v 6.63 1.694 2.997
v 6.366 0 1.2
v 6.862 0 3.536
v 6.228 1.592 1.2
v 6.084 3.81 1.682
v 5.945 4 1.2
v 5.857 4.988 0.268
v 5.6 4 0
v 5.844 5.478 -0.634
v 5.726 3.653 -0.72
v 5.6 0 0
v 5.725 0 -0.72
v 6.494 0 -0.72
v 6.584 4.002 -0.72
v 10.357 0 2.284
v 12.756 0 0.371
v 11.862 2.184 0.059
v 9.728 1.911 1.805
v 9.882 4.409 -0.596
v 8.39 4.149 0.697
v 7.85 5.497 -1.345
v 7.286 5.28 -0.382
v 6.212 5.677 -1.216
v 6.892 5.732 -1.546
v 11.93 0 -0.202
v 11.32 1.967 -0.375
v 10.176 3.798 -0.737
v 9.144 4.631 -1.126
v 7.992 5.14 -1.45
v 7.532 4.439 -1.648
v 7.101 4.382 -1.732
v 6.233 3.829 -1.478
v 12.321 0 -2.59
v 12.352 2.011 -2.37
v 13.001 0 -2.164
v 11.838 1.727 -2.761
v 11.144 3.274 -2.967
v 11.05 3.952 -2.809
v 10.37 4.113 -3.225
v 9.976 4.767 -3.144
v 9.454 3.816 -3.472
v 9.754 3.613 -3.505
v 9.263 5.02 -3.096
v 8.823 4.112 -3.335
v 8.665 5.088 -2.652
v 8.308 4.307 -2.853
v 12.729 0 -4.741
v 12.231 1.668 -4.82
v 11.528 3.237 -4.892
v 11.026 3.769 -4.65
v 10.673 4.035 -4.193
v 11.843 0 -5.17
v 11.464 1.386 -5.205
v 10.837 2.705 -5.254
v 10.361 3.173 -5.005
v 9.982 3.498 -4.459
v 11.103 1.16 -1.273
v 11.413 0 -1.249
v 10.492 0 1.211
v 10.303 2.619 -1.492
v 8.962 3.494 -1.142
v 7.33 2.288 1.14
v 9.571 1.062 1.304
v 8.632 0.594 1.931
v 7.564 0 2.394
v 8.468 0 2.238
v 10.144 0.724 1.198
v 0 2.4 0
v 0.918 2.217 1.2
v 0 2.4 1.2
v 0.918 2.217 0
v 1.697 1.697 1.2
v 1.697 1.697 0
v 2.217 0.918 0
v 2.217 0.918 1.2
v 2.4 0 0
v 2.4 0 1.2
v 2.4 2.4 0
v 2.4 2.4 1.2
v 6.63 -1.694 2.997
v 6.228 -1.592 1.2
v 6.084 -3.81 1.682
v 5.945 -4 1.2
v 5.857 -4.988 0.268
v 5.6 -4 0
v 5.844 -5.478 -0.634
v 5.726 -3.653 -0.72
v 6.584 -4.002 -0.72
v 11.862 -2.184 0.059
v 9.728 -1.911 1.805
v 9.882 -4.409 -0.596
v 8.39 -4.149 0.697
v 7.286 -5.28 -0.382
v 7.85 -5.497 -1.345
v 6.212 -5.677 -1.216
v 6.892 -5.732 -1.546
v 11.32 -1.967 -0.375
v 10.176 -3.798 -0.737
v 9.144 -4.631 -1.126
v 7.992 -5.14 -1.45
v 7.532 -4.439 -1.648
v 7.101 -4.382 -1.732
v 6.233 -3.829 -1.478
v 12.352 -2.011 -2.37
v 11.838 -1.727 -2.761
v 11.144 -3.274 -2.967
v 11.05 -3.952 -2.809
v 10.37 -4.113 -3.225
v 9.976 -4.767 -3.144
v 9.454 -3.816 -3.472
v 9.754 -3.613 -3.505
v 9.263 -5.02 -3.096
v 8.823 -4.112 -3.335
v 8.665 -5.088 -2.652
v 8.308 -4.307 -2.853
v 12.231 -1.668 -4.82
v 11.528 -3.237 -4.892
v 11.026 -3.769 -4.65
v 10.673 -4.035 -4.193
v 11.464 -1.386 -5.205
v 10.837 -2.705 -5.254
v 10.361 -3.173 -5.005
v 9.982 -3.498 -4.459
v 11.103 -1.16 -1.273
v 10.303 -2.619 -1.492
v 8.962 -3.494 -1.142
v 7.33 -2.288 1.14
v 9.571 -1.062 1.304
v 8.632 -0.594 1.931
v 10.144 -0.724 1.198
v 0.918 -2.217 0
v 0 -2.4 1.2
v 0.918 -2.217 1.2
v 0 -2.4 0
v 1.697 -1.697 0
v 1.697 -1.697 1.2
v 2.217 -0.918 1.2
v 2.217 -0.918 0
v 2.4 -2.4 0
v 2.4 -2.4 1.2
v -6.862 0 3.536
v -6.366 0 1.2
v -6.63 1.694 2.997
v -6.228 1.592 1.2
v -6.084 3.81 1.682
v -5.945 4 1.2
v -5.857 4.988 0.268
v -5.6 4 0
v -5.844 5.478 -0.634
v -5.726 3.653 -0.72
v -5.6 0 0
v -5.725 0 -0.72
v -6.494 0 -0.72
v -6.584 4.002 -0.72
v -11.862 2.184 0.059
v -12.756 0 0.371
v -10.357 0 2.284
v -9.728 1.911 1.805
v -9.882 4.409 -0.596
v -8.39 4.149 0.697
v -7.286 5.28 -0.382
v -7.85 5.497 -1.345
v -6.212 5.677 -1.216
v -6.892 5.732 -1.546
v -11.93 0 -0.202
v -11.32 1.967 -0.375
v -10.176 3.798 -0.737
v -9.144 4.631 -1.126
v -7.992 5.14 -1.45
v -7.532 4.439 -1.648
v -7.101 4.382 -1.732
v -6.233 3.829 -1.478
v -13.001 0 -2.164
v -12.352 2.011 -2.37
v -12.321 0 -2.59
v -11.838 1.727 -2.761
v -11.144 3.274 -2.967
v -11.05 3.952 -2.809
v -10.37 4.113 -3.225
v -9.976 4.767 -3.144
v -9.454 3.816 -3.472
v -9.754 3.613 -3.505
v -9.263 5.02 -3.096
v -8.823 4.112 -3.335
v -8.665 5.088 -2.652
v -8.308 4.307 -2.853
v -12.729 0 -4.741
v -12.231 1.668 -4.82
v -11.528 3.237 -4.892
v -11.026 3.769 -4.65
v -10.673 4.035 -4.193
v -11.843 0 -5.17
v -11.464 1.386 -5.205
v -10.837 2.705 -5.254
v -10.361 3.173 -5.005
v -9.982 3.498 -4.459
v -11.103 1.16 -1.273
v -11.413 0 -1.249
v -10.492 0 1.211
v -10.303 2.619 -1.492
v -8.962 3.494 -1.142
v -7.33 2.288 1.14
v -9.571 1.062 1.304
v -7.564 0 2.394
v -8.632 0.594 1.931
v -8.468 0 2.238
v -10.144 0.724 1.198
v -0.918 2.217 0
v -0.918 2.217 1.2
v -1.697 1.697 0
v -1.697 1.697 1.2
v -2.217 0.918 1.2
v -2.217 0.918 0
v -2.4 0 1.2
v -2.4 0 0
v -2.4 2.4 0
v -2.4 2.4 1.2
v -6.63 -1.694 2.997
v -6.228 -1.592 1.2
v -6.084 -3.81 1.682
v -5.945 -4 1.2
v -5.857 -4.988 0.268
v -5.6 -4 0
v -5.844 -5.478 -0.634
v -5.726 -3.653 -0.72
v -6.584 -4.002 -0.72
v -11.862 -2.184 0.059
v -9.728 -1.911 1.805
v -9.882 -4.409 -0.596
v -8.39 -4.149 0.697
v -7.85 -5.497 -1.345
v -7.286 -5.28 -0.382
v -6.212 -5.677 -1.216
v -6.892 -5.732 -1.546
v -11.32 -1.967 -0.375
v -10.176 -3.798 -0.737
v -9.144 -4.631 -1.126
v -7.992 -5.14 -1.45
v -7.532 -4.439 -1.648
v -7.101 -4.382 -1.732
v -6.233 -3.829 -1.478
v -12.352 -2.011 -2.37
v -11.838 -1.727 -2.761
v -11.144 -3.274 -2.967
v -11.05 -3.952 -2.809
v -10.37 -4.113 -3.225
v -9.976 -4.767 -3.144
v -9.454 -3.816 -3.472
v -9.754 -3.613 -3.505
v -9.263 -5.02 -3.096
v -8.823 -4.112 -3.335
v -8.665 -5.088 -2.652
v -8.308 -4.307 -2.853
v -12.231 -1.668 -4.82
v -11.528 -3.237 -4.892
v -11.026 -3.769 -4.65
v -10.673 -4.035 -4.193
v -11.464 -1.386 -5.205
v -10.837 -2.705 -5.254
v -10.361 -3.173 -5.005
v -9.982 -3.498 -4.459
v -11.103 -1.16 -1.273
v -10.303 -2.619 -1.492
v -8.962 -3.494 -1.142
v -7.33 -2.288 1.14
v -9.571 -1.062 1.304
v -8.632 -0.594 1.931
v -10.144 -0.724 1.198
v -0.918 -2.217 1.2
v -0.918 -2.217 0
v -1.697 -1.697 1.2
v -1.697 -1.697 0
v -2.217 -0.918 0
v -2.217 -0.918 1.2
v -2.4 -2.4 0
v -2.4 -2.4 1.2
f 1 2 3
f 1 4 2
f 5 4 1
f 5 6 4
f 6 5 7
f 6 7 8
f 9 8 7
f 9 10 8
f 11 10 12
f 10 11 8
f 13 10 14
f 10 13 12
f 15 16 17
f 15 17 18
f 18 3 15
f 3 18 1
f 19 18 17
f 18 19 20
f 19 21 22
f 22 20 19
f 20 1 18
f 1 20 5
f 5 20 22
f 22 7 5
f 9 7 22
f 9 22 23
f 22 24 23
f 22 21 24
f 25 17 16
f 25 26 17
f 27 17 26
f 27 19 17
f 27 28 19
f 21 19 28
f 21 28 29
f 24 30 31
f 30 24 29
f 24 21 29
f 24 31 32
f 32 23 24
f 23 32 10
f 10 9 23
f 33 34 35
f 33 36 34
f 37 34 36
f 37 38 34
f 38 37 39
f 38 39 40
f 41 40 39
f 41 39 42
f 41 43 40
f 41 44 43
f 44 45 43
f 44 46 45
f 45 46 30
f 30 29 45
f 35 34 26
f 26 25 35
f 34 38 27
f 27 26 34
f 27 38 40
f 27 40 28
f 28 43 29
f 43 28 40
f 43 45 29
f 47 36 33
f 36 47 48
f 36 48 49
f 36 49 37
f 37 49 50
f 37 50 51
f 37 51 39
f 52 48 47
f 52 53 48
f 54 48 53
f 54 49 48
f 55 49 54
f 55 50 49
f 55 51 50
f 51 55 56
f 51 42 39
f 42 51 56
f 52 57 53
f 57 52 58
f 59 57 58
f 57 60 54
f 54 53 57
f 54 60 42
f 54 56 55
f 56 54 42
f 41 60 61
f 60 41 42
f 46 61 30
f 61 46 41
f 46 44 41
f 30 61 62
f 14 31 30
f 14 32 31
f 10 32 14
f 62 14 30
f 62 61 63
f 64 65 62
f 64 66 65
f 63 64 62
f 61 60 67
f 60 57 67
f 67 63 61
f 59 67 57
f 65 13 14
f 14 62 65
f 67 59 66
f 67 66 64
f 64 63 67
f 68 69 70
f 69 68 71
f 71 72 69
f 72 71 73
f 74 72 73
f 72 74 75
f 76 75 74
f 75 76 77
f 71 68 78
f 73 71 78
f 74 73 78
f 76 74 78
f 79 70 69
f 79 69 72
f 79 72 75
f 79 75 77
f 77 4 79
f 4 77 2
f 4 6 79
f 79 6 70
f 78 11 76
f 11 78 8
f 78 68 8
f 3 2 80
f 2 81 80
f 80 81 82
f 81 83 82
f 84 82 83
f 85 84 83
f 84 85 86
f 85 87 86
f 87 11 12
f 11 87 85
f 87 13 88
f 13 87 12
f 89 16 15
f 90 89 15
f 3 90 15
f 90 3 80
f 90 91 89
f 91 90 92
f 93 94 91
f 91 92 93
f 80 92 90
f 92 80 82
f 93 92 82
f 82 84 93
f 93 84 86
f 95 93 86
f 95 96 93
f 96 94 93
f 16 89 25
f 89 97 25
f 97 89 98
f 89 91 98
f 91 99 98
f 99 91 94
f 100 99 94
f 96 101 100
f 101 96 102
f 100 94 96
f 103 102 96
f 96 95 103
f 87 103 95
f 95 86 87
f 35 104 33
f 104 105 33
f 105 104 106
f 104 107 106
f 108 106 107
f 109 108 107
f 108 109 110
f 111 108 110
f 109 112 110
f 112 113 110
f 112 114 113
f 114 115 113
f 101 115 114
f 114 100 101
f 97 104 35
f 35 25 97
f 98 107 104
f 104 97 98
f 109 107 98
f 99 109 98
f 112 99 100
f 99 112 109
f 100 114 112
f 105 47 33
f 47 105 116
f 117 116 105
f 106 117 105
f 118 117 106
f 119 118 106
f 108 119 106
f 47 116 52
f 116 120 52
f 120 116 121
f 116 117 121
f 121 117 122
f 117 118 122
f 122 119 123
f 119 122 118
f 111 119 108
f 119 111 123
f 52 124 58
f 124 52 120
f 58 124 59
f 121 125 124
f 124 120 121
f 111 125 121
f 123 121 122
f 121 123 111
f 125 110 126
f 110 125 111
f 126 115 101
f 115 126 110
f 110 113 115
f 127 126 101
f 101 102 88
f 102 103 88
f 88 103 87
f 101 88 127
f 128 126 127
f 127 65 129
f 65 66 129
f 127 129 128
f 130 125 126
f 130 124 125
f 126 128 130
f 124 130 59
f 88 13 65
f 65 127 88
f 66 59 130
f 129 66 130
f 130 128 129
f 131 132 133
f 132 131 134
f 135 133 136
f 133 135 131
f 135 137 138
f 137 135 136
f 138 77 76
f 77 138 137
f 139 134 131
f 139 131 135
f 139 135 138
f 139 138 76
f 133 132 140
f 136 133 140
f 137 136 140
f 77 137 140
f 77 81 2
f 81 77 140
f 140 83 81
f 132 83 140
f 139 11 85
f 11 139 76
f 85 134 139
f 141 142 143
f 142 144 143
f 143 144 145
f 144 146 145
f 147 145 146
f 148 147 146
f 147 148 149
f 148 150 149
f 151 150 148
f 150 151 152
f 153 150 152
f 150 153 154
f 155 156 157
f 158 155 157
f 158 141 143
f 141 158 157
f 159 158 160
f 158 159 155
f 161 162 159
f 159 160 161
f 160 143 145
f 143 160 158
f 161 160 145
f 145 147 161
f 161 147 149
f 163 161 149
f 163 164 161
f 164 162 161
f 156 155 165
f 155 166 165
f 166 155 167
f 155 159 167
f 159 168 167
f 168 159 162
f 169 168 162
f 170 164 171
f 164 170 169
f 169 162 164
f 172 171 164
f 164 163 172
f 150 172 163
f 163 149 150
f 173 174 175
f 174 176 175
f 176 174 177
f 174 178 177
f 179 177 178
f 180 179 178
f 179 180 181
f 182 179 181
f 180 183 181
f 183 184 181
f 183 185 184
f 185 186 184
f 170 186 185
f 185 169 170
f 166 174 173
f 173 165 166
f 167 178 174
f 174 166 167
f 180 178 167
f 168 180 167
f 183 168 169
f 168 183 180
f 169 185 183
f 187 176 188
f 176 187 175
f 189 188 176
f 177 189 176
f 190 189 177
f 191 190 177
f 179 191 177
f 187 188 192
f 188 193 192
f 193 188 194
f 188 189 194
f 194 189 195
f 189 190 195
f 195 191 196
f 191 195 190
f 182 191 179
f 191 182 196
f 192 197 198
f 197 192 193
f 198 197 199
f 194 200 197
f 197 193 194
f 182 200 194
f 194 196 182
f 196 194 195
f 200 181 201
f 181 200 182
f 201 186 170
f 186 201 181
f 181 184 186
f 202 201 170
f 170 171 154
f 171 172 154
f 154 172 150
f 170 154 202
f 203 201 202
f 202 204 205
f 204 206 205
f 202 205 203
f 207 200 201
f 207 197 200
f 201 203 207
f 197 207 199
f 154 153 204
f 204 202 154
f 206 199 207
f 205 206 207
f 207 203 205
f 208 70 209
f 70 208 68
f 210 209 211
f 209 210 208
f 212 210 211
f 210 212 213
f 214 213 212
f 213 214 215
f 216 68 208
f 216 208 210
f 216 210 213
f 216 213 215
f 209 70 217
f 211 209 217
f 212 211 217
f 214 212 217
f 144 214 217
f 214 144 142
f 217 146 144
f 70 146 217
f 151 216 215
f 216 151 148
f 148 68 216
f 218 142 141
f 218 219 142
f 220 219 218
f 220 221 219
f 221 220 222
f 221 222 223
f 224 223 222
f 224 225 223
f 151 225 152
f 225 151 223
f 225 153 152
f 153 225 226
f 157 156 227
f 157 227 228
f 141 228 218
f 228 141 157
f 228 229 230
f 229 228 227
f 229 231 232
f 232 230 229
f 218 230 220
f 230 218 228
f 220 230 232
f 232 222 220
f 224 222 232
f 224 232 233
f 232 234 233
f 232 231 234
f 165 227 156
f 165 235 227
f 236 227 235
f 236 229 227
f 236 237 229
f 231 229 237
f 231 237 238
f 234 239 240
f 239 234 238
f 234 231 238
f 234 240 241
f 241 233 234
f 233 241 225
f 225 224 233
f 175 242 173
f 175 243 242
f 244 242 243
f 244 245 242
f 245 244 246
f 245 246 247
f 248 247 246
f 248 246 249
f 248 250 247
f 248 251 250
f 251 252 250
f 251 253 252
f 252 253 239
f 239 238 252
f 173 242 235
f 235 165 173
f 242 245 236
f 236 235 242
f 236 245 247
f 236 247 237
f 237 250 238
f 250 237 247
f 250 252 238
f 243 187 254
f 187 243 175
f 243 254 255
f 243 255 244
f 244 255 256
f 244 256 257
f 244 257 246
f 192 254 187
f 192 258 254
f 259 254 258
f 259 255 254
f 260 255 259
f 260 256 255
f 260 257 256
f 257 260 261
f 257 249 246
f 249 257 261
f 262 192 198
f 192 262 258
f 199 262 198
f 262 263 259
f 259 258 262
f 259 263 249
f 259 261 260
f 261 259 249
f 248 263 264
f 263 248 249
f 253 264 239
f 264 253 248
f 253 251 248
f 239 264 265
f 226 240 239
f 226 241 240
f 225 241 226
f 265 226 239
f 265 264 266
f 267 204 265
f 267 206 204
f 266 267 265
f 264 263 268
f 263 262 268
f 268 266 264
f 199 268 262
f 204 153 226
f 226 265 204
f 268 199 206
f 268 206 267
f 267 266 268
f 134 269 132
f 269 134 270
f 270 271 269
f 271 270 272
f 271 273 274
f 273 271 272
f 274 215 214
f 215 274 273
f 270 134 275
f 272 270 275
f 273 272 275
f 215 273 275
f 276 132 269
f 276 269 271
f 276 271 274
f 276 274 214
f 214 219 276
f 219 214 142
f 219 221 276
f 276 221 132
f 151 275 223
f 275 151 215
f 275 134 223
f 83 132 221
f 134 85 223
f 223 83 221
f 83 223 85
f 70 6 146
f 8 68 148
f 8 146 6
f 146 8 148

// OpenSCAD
// file: ../p/1-4edge.scad
use <../lib.scad>
function ldraw_lib__1_4edge() = [
// 0 Circle 0.25
// 0 Name: 1-4edge.dat
// 0 Author: James Jessiman
// 0 !LDRAW_ORG Primitive UPDATE 2017-01
// 0 !LICENSE Licensed under CC BY 4.0 : see CAreadme.txt
// 
// 0 BFC CERTIFY CCW
  [0,"BFC","CERTIFY"],
  [0,"BFC","CCW"],
// 
// 0 !HISTORY 2007-06-22 [PTadmin] Header formatted for Contributor Agreement
// 0 !HISTORY 2008-07-01 [PTadmin] Official Update 2008-01
// 0 !HISTORY 2017-01-15 [Steffen] BFCed
// 0 !HISTORY 2017-12-30 [PTadmin] Official Update 2017-01
// 
// 
// 2 24 1 0 0 0.9239 0 0.3827
  [2,24,1,0,0,0.9239,0,0.3827],
// 2 24 0.9239 0 0.3827 0.7071 0 0.7071
  [2,24,0.9239,0,0.3827,0.7071,0,0.7071],
// 2 24 0.7071 0 0.7071 0.3827 0 0.9239
  [2,24,0.7071,0,0.7071,0.3827,0,0.9239],
// 2 24 0.3827 0 0.9239 0 0 1
  [2,24,0.3827,0,0.9239,0,0,1],
];
module ldraw_lib__1_4edge(step=0, col=false, unit=2/5, alt=false, line=0.2, solid=!$preview)
    makepoly(ldraw_lib__1_4edge(), step=step, col=col, unit=unit, alt=alt, line=line, solid=solid);
ldraw_lib__1_4edge(line=0.2);
// file: ../p/1-4cyli.scad
use <../lib.scad>
function ldraw_lib__1_4cyli() = [
// 0 Cylinder 0.25
// 0 Name: 1-4cyli.dat
// 0 Author: James Jessiman
// 0 !LDRAW_ORG Primitive UPDATE 2012-01
// 0 !LICENSE Licensed under CC BY 4.0 : see CAreadme.txt
// 
// 0 BFC CERTIFY CCW
  [0,"BFC","CERTIFY"],
  [0,"BFC","CCW"],
// 
// 0 !HISTORY 2002-03-23 [sbliss] Added BFC statement.
// 0 !HISTORY 2002-04-25 [PTadmin] Official Update 2002-02
// 0 !HISTORY 2007-06-22 [PTadmin] Header formatted for Contributor Agreement
// 0 !HISTORY 2008-07-01 [PTadmin] Official Update 2008-01
// 0 !HISTORY 2012-02-16 [Philo] Changed to CCW
// 0 !HISTORY 2012-03-30 [PTadmin] Official Update 2012-01
// 
// 
// 4 16 1 1 0 0.9239 1 0.3827 0.9239 0 0.3827 1 0 0
  [4,16,1,1,0,0.9239,1,0.3827,0.9239,0,0.3827,1,0,0],
// 5 24 1 0 0 1 1 0 0.9239 0 0.3827 1 0 -1
  [5,24,1,0,0,1,1,0,0.9239,0,0.3827,1,0,-1],
// 4 16 0.9239 1 0.3827 0.7071 1 0.7071 0.7071 0 0.7071 0.9239 0 0.3827
  [4,16,0.9239,1,0.3827,0.7071,1,0.7071,0.7071,0,0.7071,0.9239,0,0.3827],
// 5 24 0.9239 0 0.3827 0.9239 1 0.3827 0.7071 0 0.7071 1 0 0
  [5,24,0.9239,0,0.3827,0.9239,1,0.3827,0.7071,0,0.7071,1,0,0],
// 4 16 0.7071 1 0.7071 0.3827 1 0.9239 0.3827 0 0.9239 0.7071 0 0.7071
  [4,16,0.7071,1,0.7071,0.3827,1,0.9239,0.3827,0,0.9239,0.7071,0,0.7071],
// 5 24 0.7071 0 0.7071 0.7071 1 0.7071 0.3827 0 0.9239 0.9239 0 0.3827
  [5,24,0.7071,0,0.7071,0.7071,1,0.7071,0.3827,0,0.9239,0.9239,0,0.3827],
// 4 16 0.3827 1 0.9239 0 1 1 0 0 1 0.3827 0 0.9239
  [4,16,0.3827,1,0.9239,0,1,1,0,0,1,0.3827,0,0.9239],
// 5 24 0.3827 0 0.9239 0.3827 1 0.9239 0 0 1 0.7071 0 0.7071
  [5,24,0.3827,0,0.9239,0.3827,1,0.9239,0,0,1,0.7071,0,0.7071],
// 5 24 0 0 1 0 1 1 0.3827 0 0.9239 -1 0 1
  [5,24,0,0,1,0,1,1,0.3827,0,0.9239,-1,0,1],
];
module ldraw_lib__1_4cyli(step=0, col=false, unit=2/5, alt=false, line=0.2, solid=!$preview)
    makepoly(ldraw_lib__1_4cyli(), step=step, col=col, unit=unit, alt=alt, line=line, solid=solid);
ldraw_lib__1_4cyli(line=0.2);
// file: ../p/1-4ndis.scad
use <../lib.scad>
function ldraw_lib__1_4ndis() = [
// 0 Disc Negative 0.25
// 0 Name: 1-4ndis.dat
// 0 Author: James Jessiman
// 0 !LDRAW_ORG Primitive UPDATE 2012-01
// 0 !LICENSE Licensed under CC BY 4.0 : see CAreadme.txt
// 
// 0 BFC CERTIFY CCW
  [0,"BFC","CERTIFY"],
  [0,"BFC","CCW"],
// 
// 0 !HISTORY 2002-03-23 [sbliss] Added BFC Statement
// 0 !HISTORY 2002-04-25 [PTadmin] Official Update 2002-02
// 0 !HISTORY 2007-06-22 [PTadmin] Header formatted for Contributor Agreement
// 0 !HISTORY 2008-07-01 [PTadmin] Official Update 2008-01
// 0 !HISTORY 2012-02-16 [Philo] Changed to CCW
// 0 !HISTORY 2012-03-30 [PTadmin] Official Update 2012-01
// 
// 
// 3 16 0.9239 0 0.3827 1 0 0 1 0 1
  [3,16,0.9239,0,0.3827,1,0,0,1,0,1],
// 3 16 0.7071 0 0.7071 0.9239 0 0.3827 1 0 1
  [3,16,0.7071,0,0.7071,0.9239,0,0.3827,1,0,1],
// 3 16 0.3827 0 0.9239 0.7071 0 0.7071 1 0 1
  [3,16,0.3827,0,0.9239,0.7071,0,0.7071,1,0,1],
// 3 16 0 0 1 0.3827 0 0.9239 1 0 1
  [3,16,0,0,1,0.3827,0,0.9239,1,0,1],
];
module ldraw_lib__1_4ndis(step=0, col=false, unit=2/5, alt=false, line=0.2, solid=!$preview)
    makepoly(ldraw_lib__1_4ndis(), step=step, col=col, unit=unit, alt=alt, line=line, solid=solid);
ldraw_lib__1_4ndis(line=0.2);
// file: ../p/1-4cylo.scad
use <../lib.scad>
use <1-4cyli.scad>
use <1-4edge.scad>
function ldraw_lib__1_4cylo() = [
// 0 Cylinder Open 0.25
// 0 Name: 1-4cylo.dat
// 0 Author: Max Martin Richter [MMR1988]
// 0 !LDRAW_ORG Primitive UPDATE 2010-03
// 0 !LICENSE Licensed under CC BY 4.0 : see CAreadme.txt
// 
// 0 BFC CERTIFY CCW
  [0,"BFC","CERTIFY"],
  [0,"BFC","CCW"],
// 
// 0 !HISTORY 2010-12-31 [PTadmin] Official Update 2010-03
// 
// 
// 1 16 0 0 0 1 0 0 0 1 0 0 0 1 1-4edge.dat
  [1,16,0,0,0,1,0,0,0,1,0,0,0,1, ldraw_lib__1_4edge()],
// 1 16 0 1 0 1 0 0 0 1 0 0 0 1 1-4edge.dat
  [1,16,0,1,0,1,0,0,0,1,0,0,0,1, ldraw_lib__1_4edge()],
// 1 16 0 0 0 1 0 0 0 1 0 0 0 1 1-4cyli.dat
  [1,16,0,0,0,1,0,0,0,1,0,0,0,1, ldraw_lib__1_4cyli()],
];
module ldraw_lib__1_4cylo(step=0, col=false, unit=2/5, alt=false, line=0.2, solid=!$preview)
    makepoly(ldraw_lib__1_4cylo(), step=step, col=col, unit=unit, alt=alt, line=line, solid=solid);
ldraw_lib__1_4cylo(line=0.2);
// main file
use <../lib.scad>
use <s/37614s01.scad>
function ldraw_lib__37614() = [
// 0 Minifig Shoulder Guards
// 0 Name: 37614.dat
// 0 Author: Philippe Hurbain [Philo]
// 0 !LDRAW_ORG Part UPDATE 2024-05
// 0 !LICENSE Licensed under CC BY 4.0 : see CAreadme.txt
// 
// 0 BFC CERTIFY CCW
  [0,"BFC","CERTIFY"],
  [0,"BFC","CCW"],
// 
// 0 !CATEGORY Minifig Neckwear
// 0 !KEYWORDS Pads, Ridges
// 
// 0 !HISTORY 2022-10-26 {LEGO Instructions App} Original part shape
// 0 !HISTORY 2022-10-26 [Philo] File preparation for LDraw Parts Tracker
// 0 !HISTORY 2024-06-30 [OrionP] Official Update 2024-05
// 
// 
// 1 16 0 0 0 1 0 0 0 1 0 0 0 1 s\37614s01.dat
  [1,16,0,0,0,1,0,0,0,1,0,0,0,1, ldraw_lib__s__37614s01()],
// 1 16 0 0 0 1 0 0 0 1 0 0 0 -1 s\37614s01.dat
  [1,16,0,0,0,1,0,0,0,1,0,0,0,-1, ldraw_lib__s__37614s01()],
// 1 16 0 0 0 -1 0 0 0 1 0 0 0 1 s\37614s01.dat
  [1,16,0,0,0,-1,0,0,0,1,0,0,0,1, ldraw_lib__s__37614s01()],
// 1 16 0 0 0 -1 0 0 0 1 0 0 0 -1 s\37614s01.dat
  [1,16,0,0,0,-1,0,0,0,1,0,0,0,-1, ldraw_lib__s__37614s01()],
// 3 16 14.862 -3 -10 0 -3 -6 -14.862 -3 -10
  [3,16,14.862,-3,-10,0,-3,-6,-14.862,-3,-10],
// 3 16 0 0 -6 14 0 -10 -14 0 -10
  [3,16,0,0,-6,14,0,-10,-14,0,-10],
// 2 24 14.862 -3 -10 -14.862 -3 -10
  [2,24,14.862,-3,-10,-14.862,-3,-10],
// 2 24 -14 0 -10 14 0 -10
  [2,24,-14,0,-10,14,0,-10],
// 4 16 14 0 -10 14.862 -3 -10 -14.862 -3 -10 -14 0 -10
  [4,16,14,0,-10,14.862,-3,-10,-14.862,-3,-10,-14,0,-10],
// 3 16 0 -3 6 14.862 -3 10 -14.862 -3 10
  [3,16,0,-3,6,14.862,-3,10,-14.862,-3,10],
// 3 16 14 0 10 0 0 6 -14 0 10
  [3,16,14,0,10,0,0,6,-14,0,10],
// 2 24 14.862 -3 10 -14.862 -3 10
  [2,24,14.862,-3,10,-14.862,-3,10],
// 2 24 -14 0 10 14 0 10
  [2,24,-14,0,10,14,0,10],
// 4 16 -14.862 -3 10 14.862 -3 10 14 0 10 -14 0 10
  [4,16,-14.862,-3,10,14.862,-3,10,14,0,10,-14,0,10],
// 5 24 -18.91 -5.984 0 -16.236 1.8 0 -16.46 1.8 10.005 -16.46 1.8 -10.005
  [5,24,-18.91,-5.984,0,-16.236,1.8,0,-16.46,1.8,10.005,-16.46,1.8,-10.005],
// 5 24 -26.23 -3.027 0 -21.169 -5.595 0 -25.359 -2.994 1.81 -25.359 -2.994 -1.81
  [5,24,-26.23,-3.027,0,-21.169,-5.595,0,-25.359,-2.994,1.81,-25.359,-2.994,-1.81],
// 5 24 -32.502 5.411 0 -30.803 6.476 0 -30.88 5.925 5.027 -30.88 5.925 -5.027
  [5,24,-32.502,5.411,0,-30.803,6.476,0,-30.88,5.925,5.027,-30.88,5.925,-5.027],
// 5 24 32.502 5.411 0 30.803 6.476 0 30.88 5.925 -5.027 30.88 5.925 5.027
  [5,24,32.502,5.411,0,30.803,6.476,0,30.88,5.925,-5.027,30.88,5.925,5.027],
// 5 24 26.23 -3.027 0 21.169 -5.595 0 25.359 -2.994 -1.81 25.359 -2.994 1.81
  [5,24,26.23,-3.027,0,21.169,-5.595,0,25.359,-2.994,-1.81,25.359,-2.994,1.81],
// 5 24 18.91 -5.984 0 16.236 1.8 0 16.46 1.8 -10.005 16.46 1.8 10.005
  [5,24,18.91,-5.984,0,16.236,1.8,0,16.46,1.8,-10.005,16.46,1.8,10.005],
// 2 24 17.154 -8.839 0 25.892 -5.709 0
  [2,24,17.154,-8.839,0,25.892,-5.709,0],
// 2 24 -17.154 -8.839 0 -25.892 -5.709 0
  [2,24,-17.154,-8.839,0,-25.892,-5.709,0],
// 5 24 -31.889 -0.927 0 -29.824 0.504 0 -29.656 -0.147 -5.459 -29.656 -0.147 5.459
  [5,24,-31.889,-0.927,0,-29.824,0.504,0,-29.656,-0.147,-5.459,-29.656,-0.147,5.459],
// 2 24 -30.803 6.476 0 -31.823 11.852 0
  [2,24,-30.803,6.476,0,-31.823,11.852,0],
// 2 24 -29.824 0.504 0 -32.502 5.411 0
  [2,24,-29.824,0.504,0,-32.502,5.411,0],
// 5 24 31.889 -0.927 0 29.824 0.504 0 29.656 -0.147 5.459 29.656 -0.147 -5.459
  [5,24,31.889,-0.927,0,29.824,0.504,0,29.656,-0.147,5.459,29.656,-0.147,-5.459],
// 5 24 29.608 12.924 0 28.532 3.122 0 27.758 3.182 -2.899 27.758 3.182 2.899
  [5,24,29.608,12.924,0,28.532,3.122,0,27.758,3.182,-2.899,27.758,3.182,2.899],
// 5 24 -21.169 -5.595 0 -18.91 -5.984 0 -21.58 -4.827 1.485 -21.58 -4.827 -1.485
  [5,24,-21.169,-5.595,0,-18.91,-5.984,0,-21.58,-4.827,1.485,-21.58,-4.827,-1.485],
// 5 24 -29.608 12.924 0 -28.532 3.122 0 -27.758 3.182 -2.899 -27.758 3.182 2.899
  [5,24,-29.608,12.924,0,-28.532,3.122,0,-27.758,3.182,-2.899,-27.758,3.182,2.899],
// 5 24 -28.532 3.122 0 -26.23 -3.027 0 -27.758 3.182 2.899 -27.758 3.182 -2.899
  [5,24,-28.532,3.122,0,-26.23,-3.027,0,-27.758,3.182,2.899,-27.758,3.182,-2.899],
// 2 24 -25.892 -5.709 0 -31.889 -0.927 0
  [2,24,-25.892,-5.709,0,-31.889,-0.927,0],
// 2 24 25.892 -5.709 0 31.889 -0.927 0
  [2,24,25.892,-5.709,0,31.889,-0.927,0],
// 5 24 -31.823 11.852 0 -29.608 12.924 0 -30.578 12.051 -4.169 -30.578 12.051 4.169
  [5,24,-31.823,11.852,0,-29.608,12.924,0,-30.578,12.051,-4.169,-30.578,12.051,4.169],
// 5 24 15.914 -3 0 17.154 -8.839 0 16.576 -7.493 4.235 16.576 -7.493 -4.235
  [5,24,15.914,-3,0,17.154,-8.839,0,16.576,-7.493,4.235,16.576,-7.493,-4.235],
// 5 24 31.823 11.852 0 29.608 12.924 0 30.578 12.051 4.169 30.578 12.051 -4.169
  [5,24,31.823,11.852,0,29.608,12.924,0,30.578,12.051,4.169,30.578,12.051,-4.169],
// 5 24 -15.914 -3 0 -17.154 -8.839 0 -16.576 -7.493 4.235 -16.576 -7.493 -4.235
  [5,24,-15.914,-3,0,-17.154,-8.839,0,-16.576,-7.493,4.235,-16.576,-7.493,-4.235],
// 2 24 29.824 0.504 0 32.502 5.411 0
  [2,24,29.824,0.504,0,32.502,5.411,0],
// 2 24 30.803 6.476 0 31.823 11.852 0
  [2,24,30.803,6.476,0,31.823,11.852,0],
// 5 24 28.532 3.122 0 26.23 -3.027 0 27.758 3.182 -2.899 27.758 3.182 2.899
  [5,24,28.532,3.122,0,26.23,-3.027,0,27.758,3.182,-2.899,27.758,3.182,2.899],
// 5 24 21.169 -5.595 0 18.91 -5.984 0 21.58 -4.827 -1.485 21.58 -4.827 1.485
  [5,24,21.169,-5.595,0,18.91,-5.984,0,21.58,-4.827,-1.485,21.58,-4.827,1.485],
];
module ldraw_lib__37614(step=0, col=false, unit=2/5, alt=false, line=0.2, solid=!$preview)
    makepoly(ldraw_lib__37614(), step=step, col=col, unit=unit, alt=alt, line=line, solid=solid);
ldraw_lib__37614(line=0.2);
